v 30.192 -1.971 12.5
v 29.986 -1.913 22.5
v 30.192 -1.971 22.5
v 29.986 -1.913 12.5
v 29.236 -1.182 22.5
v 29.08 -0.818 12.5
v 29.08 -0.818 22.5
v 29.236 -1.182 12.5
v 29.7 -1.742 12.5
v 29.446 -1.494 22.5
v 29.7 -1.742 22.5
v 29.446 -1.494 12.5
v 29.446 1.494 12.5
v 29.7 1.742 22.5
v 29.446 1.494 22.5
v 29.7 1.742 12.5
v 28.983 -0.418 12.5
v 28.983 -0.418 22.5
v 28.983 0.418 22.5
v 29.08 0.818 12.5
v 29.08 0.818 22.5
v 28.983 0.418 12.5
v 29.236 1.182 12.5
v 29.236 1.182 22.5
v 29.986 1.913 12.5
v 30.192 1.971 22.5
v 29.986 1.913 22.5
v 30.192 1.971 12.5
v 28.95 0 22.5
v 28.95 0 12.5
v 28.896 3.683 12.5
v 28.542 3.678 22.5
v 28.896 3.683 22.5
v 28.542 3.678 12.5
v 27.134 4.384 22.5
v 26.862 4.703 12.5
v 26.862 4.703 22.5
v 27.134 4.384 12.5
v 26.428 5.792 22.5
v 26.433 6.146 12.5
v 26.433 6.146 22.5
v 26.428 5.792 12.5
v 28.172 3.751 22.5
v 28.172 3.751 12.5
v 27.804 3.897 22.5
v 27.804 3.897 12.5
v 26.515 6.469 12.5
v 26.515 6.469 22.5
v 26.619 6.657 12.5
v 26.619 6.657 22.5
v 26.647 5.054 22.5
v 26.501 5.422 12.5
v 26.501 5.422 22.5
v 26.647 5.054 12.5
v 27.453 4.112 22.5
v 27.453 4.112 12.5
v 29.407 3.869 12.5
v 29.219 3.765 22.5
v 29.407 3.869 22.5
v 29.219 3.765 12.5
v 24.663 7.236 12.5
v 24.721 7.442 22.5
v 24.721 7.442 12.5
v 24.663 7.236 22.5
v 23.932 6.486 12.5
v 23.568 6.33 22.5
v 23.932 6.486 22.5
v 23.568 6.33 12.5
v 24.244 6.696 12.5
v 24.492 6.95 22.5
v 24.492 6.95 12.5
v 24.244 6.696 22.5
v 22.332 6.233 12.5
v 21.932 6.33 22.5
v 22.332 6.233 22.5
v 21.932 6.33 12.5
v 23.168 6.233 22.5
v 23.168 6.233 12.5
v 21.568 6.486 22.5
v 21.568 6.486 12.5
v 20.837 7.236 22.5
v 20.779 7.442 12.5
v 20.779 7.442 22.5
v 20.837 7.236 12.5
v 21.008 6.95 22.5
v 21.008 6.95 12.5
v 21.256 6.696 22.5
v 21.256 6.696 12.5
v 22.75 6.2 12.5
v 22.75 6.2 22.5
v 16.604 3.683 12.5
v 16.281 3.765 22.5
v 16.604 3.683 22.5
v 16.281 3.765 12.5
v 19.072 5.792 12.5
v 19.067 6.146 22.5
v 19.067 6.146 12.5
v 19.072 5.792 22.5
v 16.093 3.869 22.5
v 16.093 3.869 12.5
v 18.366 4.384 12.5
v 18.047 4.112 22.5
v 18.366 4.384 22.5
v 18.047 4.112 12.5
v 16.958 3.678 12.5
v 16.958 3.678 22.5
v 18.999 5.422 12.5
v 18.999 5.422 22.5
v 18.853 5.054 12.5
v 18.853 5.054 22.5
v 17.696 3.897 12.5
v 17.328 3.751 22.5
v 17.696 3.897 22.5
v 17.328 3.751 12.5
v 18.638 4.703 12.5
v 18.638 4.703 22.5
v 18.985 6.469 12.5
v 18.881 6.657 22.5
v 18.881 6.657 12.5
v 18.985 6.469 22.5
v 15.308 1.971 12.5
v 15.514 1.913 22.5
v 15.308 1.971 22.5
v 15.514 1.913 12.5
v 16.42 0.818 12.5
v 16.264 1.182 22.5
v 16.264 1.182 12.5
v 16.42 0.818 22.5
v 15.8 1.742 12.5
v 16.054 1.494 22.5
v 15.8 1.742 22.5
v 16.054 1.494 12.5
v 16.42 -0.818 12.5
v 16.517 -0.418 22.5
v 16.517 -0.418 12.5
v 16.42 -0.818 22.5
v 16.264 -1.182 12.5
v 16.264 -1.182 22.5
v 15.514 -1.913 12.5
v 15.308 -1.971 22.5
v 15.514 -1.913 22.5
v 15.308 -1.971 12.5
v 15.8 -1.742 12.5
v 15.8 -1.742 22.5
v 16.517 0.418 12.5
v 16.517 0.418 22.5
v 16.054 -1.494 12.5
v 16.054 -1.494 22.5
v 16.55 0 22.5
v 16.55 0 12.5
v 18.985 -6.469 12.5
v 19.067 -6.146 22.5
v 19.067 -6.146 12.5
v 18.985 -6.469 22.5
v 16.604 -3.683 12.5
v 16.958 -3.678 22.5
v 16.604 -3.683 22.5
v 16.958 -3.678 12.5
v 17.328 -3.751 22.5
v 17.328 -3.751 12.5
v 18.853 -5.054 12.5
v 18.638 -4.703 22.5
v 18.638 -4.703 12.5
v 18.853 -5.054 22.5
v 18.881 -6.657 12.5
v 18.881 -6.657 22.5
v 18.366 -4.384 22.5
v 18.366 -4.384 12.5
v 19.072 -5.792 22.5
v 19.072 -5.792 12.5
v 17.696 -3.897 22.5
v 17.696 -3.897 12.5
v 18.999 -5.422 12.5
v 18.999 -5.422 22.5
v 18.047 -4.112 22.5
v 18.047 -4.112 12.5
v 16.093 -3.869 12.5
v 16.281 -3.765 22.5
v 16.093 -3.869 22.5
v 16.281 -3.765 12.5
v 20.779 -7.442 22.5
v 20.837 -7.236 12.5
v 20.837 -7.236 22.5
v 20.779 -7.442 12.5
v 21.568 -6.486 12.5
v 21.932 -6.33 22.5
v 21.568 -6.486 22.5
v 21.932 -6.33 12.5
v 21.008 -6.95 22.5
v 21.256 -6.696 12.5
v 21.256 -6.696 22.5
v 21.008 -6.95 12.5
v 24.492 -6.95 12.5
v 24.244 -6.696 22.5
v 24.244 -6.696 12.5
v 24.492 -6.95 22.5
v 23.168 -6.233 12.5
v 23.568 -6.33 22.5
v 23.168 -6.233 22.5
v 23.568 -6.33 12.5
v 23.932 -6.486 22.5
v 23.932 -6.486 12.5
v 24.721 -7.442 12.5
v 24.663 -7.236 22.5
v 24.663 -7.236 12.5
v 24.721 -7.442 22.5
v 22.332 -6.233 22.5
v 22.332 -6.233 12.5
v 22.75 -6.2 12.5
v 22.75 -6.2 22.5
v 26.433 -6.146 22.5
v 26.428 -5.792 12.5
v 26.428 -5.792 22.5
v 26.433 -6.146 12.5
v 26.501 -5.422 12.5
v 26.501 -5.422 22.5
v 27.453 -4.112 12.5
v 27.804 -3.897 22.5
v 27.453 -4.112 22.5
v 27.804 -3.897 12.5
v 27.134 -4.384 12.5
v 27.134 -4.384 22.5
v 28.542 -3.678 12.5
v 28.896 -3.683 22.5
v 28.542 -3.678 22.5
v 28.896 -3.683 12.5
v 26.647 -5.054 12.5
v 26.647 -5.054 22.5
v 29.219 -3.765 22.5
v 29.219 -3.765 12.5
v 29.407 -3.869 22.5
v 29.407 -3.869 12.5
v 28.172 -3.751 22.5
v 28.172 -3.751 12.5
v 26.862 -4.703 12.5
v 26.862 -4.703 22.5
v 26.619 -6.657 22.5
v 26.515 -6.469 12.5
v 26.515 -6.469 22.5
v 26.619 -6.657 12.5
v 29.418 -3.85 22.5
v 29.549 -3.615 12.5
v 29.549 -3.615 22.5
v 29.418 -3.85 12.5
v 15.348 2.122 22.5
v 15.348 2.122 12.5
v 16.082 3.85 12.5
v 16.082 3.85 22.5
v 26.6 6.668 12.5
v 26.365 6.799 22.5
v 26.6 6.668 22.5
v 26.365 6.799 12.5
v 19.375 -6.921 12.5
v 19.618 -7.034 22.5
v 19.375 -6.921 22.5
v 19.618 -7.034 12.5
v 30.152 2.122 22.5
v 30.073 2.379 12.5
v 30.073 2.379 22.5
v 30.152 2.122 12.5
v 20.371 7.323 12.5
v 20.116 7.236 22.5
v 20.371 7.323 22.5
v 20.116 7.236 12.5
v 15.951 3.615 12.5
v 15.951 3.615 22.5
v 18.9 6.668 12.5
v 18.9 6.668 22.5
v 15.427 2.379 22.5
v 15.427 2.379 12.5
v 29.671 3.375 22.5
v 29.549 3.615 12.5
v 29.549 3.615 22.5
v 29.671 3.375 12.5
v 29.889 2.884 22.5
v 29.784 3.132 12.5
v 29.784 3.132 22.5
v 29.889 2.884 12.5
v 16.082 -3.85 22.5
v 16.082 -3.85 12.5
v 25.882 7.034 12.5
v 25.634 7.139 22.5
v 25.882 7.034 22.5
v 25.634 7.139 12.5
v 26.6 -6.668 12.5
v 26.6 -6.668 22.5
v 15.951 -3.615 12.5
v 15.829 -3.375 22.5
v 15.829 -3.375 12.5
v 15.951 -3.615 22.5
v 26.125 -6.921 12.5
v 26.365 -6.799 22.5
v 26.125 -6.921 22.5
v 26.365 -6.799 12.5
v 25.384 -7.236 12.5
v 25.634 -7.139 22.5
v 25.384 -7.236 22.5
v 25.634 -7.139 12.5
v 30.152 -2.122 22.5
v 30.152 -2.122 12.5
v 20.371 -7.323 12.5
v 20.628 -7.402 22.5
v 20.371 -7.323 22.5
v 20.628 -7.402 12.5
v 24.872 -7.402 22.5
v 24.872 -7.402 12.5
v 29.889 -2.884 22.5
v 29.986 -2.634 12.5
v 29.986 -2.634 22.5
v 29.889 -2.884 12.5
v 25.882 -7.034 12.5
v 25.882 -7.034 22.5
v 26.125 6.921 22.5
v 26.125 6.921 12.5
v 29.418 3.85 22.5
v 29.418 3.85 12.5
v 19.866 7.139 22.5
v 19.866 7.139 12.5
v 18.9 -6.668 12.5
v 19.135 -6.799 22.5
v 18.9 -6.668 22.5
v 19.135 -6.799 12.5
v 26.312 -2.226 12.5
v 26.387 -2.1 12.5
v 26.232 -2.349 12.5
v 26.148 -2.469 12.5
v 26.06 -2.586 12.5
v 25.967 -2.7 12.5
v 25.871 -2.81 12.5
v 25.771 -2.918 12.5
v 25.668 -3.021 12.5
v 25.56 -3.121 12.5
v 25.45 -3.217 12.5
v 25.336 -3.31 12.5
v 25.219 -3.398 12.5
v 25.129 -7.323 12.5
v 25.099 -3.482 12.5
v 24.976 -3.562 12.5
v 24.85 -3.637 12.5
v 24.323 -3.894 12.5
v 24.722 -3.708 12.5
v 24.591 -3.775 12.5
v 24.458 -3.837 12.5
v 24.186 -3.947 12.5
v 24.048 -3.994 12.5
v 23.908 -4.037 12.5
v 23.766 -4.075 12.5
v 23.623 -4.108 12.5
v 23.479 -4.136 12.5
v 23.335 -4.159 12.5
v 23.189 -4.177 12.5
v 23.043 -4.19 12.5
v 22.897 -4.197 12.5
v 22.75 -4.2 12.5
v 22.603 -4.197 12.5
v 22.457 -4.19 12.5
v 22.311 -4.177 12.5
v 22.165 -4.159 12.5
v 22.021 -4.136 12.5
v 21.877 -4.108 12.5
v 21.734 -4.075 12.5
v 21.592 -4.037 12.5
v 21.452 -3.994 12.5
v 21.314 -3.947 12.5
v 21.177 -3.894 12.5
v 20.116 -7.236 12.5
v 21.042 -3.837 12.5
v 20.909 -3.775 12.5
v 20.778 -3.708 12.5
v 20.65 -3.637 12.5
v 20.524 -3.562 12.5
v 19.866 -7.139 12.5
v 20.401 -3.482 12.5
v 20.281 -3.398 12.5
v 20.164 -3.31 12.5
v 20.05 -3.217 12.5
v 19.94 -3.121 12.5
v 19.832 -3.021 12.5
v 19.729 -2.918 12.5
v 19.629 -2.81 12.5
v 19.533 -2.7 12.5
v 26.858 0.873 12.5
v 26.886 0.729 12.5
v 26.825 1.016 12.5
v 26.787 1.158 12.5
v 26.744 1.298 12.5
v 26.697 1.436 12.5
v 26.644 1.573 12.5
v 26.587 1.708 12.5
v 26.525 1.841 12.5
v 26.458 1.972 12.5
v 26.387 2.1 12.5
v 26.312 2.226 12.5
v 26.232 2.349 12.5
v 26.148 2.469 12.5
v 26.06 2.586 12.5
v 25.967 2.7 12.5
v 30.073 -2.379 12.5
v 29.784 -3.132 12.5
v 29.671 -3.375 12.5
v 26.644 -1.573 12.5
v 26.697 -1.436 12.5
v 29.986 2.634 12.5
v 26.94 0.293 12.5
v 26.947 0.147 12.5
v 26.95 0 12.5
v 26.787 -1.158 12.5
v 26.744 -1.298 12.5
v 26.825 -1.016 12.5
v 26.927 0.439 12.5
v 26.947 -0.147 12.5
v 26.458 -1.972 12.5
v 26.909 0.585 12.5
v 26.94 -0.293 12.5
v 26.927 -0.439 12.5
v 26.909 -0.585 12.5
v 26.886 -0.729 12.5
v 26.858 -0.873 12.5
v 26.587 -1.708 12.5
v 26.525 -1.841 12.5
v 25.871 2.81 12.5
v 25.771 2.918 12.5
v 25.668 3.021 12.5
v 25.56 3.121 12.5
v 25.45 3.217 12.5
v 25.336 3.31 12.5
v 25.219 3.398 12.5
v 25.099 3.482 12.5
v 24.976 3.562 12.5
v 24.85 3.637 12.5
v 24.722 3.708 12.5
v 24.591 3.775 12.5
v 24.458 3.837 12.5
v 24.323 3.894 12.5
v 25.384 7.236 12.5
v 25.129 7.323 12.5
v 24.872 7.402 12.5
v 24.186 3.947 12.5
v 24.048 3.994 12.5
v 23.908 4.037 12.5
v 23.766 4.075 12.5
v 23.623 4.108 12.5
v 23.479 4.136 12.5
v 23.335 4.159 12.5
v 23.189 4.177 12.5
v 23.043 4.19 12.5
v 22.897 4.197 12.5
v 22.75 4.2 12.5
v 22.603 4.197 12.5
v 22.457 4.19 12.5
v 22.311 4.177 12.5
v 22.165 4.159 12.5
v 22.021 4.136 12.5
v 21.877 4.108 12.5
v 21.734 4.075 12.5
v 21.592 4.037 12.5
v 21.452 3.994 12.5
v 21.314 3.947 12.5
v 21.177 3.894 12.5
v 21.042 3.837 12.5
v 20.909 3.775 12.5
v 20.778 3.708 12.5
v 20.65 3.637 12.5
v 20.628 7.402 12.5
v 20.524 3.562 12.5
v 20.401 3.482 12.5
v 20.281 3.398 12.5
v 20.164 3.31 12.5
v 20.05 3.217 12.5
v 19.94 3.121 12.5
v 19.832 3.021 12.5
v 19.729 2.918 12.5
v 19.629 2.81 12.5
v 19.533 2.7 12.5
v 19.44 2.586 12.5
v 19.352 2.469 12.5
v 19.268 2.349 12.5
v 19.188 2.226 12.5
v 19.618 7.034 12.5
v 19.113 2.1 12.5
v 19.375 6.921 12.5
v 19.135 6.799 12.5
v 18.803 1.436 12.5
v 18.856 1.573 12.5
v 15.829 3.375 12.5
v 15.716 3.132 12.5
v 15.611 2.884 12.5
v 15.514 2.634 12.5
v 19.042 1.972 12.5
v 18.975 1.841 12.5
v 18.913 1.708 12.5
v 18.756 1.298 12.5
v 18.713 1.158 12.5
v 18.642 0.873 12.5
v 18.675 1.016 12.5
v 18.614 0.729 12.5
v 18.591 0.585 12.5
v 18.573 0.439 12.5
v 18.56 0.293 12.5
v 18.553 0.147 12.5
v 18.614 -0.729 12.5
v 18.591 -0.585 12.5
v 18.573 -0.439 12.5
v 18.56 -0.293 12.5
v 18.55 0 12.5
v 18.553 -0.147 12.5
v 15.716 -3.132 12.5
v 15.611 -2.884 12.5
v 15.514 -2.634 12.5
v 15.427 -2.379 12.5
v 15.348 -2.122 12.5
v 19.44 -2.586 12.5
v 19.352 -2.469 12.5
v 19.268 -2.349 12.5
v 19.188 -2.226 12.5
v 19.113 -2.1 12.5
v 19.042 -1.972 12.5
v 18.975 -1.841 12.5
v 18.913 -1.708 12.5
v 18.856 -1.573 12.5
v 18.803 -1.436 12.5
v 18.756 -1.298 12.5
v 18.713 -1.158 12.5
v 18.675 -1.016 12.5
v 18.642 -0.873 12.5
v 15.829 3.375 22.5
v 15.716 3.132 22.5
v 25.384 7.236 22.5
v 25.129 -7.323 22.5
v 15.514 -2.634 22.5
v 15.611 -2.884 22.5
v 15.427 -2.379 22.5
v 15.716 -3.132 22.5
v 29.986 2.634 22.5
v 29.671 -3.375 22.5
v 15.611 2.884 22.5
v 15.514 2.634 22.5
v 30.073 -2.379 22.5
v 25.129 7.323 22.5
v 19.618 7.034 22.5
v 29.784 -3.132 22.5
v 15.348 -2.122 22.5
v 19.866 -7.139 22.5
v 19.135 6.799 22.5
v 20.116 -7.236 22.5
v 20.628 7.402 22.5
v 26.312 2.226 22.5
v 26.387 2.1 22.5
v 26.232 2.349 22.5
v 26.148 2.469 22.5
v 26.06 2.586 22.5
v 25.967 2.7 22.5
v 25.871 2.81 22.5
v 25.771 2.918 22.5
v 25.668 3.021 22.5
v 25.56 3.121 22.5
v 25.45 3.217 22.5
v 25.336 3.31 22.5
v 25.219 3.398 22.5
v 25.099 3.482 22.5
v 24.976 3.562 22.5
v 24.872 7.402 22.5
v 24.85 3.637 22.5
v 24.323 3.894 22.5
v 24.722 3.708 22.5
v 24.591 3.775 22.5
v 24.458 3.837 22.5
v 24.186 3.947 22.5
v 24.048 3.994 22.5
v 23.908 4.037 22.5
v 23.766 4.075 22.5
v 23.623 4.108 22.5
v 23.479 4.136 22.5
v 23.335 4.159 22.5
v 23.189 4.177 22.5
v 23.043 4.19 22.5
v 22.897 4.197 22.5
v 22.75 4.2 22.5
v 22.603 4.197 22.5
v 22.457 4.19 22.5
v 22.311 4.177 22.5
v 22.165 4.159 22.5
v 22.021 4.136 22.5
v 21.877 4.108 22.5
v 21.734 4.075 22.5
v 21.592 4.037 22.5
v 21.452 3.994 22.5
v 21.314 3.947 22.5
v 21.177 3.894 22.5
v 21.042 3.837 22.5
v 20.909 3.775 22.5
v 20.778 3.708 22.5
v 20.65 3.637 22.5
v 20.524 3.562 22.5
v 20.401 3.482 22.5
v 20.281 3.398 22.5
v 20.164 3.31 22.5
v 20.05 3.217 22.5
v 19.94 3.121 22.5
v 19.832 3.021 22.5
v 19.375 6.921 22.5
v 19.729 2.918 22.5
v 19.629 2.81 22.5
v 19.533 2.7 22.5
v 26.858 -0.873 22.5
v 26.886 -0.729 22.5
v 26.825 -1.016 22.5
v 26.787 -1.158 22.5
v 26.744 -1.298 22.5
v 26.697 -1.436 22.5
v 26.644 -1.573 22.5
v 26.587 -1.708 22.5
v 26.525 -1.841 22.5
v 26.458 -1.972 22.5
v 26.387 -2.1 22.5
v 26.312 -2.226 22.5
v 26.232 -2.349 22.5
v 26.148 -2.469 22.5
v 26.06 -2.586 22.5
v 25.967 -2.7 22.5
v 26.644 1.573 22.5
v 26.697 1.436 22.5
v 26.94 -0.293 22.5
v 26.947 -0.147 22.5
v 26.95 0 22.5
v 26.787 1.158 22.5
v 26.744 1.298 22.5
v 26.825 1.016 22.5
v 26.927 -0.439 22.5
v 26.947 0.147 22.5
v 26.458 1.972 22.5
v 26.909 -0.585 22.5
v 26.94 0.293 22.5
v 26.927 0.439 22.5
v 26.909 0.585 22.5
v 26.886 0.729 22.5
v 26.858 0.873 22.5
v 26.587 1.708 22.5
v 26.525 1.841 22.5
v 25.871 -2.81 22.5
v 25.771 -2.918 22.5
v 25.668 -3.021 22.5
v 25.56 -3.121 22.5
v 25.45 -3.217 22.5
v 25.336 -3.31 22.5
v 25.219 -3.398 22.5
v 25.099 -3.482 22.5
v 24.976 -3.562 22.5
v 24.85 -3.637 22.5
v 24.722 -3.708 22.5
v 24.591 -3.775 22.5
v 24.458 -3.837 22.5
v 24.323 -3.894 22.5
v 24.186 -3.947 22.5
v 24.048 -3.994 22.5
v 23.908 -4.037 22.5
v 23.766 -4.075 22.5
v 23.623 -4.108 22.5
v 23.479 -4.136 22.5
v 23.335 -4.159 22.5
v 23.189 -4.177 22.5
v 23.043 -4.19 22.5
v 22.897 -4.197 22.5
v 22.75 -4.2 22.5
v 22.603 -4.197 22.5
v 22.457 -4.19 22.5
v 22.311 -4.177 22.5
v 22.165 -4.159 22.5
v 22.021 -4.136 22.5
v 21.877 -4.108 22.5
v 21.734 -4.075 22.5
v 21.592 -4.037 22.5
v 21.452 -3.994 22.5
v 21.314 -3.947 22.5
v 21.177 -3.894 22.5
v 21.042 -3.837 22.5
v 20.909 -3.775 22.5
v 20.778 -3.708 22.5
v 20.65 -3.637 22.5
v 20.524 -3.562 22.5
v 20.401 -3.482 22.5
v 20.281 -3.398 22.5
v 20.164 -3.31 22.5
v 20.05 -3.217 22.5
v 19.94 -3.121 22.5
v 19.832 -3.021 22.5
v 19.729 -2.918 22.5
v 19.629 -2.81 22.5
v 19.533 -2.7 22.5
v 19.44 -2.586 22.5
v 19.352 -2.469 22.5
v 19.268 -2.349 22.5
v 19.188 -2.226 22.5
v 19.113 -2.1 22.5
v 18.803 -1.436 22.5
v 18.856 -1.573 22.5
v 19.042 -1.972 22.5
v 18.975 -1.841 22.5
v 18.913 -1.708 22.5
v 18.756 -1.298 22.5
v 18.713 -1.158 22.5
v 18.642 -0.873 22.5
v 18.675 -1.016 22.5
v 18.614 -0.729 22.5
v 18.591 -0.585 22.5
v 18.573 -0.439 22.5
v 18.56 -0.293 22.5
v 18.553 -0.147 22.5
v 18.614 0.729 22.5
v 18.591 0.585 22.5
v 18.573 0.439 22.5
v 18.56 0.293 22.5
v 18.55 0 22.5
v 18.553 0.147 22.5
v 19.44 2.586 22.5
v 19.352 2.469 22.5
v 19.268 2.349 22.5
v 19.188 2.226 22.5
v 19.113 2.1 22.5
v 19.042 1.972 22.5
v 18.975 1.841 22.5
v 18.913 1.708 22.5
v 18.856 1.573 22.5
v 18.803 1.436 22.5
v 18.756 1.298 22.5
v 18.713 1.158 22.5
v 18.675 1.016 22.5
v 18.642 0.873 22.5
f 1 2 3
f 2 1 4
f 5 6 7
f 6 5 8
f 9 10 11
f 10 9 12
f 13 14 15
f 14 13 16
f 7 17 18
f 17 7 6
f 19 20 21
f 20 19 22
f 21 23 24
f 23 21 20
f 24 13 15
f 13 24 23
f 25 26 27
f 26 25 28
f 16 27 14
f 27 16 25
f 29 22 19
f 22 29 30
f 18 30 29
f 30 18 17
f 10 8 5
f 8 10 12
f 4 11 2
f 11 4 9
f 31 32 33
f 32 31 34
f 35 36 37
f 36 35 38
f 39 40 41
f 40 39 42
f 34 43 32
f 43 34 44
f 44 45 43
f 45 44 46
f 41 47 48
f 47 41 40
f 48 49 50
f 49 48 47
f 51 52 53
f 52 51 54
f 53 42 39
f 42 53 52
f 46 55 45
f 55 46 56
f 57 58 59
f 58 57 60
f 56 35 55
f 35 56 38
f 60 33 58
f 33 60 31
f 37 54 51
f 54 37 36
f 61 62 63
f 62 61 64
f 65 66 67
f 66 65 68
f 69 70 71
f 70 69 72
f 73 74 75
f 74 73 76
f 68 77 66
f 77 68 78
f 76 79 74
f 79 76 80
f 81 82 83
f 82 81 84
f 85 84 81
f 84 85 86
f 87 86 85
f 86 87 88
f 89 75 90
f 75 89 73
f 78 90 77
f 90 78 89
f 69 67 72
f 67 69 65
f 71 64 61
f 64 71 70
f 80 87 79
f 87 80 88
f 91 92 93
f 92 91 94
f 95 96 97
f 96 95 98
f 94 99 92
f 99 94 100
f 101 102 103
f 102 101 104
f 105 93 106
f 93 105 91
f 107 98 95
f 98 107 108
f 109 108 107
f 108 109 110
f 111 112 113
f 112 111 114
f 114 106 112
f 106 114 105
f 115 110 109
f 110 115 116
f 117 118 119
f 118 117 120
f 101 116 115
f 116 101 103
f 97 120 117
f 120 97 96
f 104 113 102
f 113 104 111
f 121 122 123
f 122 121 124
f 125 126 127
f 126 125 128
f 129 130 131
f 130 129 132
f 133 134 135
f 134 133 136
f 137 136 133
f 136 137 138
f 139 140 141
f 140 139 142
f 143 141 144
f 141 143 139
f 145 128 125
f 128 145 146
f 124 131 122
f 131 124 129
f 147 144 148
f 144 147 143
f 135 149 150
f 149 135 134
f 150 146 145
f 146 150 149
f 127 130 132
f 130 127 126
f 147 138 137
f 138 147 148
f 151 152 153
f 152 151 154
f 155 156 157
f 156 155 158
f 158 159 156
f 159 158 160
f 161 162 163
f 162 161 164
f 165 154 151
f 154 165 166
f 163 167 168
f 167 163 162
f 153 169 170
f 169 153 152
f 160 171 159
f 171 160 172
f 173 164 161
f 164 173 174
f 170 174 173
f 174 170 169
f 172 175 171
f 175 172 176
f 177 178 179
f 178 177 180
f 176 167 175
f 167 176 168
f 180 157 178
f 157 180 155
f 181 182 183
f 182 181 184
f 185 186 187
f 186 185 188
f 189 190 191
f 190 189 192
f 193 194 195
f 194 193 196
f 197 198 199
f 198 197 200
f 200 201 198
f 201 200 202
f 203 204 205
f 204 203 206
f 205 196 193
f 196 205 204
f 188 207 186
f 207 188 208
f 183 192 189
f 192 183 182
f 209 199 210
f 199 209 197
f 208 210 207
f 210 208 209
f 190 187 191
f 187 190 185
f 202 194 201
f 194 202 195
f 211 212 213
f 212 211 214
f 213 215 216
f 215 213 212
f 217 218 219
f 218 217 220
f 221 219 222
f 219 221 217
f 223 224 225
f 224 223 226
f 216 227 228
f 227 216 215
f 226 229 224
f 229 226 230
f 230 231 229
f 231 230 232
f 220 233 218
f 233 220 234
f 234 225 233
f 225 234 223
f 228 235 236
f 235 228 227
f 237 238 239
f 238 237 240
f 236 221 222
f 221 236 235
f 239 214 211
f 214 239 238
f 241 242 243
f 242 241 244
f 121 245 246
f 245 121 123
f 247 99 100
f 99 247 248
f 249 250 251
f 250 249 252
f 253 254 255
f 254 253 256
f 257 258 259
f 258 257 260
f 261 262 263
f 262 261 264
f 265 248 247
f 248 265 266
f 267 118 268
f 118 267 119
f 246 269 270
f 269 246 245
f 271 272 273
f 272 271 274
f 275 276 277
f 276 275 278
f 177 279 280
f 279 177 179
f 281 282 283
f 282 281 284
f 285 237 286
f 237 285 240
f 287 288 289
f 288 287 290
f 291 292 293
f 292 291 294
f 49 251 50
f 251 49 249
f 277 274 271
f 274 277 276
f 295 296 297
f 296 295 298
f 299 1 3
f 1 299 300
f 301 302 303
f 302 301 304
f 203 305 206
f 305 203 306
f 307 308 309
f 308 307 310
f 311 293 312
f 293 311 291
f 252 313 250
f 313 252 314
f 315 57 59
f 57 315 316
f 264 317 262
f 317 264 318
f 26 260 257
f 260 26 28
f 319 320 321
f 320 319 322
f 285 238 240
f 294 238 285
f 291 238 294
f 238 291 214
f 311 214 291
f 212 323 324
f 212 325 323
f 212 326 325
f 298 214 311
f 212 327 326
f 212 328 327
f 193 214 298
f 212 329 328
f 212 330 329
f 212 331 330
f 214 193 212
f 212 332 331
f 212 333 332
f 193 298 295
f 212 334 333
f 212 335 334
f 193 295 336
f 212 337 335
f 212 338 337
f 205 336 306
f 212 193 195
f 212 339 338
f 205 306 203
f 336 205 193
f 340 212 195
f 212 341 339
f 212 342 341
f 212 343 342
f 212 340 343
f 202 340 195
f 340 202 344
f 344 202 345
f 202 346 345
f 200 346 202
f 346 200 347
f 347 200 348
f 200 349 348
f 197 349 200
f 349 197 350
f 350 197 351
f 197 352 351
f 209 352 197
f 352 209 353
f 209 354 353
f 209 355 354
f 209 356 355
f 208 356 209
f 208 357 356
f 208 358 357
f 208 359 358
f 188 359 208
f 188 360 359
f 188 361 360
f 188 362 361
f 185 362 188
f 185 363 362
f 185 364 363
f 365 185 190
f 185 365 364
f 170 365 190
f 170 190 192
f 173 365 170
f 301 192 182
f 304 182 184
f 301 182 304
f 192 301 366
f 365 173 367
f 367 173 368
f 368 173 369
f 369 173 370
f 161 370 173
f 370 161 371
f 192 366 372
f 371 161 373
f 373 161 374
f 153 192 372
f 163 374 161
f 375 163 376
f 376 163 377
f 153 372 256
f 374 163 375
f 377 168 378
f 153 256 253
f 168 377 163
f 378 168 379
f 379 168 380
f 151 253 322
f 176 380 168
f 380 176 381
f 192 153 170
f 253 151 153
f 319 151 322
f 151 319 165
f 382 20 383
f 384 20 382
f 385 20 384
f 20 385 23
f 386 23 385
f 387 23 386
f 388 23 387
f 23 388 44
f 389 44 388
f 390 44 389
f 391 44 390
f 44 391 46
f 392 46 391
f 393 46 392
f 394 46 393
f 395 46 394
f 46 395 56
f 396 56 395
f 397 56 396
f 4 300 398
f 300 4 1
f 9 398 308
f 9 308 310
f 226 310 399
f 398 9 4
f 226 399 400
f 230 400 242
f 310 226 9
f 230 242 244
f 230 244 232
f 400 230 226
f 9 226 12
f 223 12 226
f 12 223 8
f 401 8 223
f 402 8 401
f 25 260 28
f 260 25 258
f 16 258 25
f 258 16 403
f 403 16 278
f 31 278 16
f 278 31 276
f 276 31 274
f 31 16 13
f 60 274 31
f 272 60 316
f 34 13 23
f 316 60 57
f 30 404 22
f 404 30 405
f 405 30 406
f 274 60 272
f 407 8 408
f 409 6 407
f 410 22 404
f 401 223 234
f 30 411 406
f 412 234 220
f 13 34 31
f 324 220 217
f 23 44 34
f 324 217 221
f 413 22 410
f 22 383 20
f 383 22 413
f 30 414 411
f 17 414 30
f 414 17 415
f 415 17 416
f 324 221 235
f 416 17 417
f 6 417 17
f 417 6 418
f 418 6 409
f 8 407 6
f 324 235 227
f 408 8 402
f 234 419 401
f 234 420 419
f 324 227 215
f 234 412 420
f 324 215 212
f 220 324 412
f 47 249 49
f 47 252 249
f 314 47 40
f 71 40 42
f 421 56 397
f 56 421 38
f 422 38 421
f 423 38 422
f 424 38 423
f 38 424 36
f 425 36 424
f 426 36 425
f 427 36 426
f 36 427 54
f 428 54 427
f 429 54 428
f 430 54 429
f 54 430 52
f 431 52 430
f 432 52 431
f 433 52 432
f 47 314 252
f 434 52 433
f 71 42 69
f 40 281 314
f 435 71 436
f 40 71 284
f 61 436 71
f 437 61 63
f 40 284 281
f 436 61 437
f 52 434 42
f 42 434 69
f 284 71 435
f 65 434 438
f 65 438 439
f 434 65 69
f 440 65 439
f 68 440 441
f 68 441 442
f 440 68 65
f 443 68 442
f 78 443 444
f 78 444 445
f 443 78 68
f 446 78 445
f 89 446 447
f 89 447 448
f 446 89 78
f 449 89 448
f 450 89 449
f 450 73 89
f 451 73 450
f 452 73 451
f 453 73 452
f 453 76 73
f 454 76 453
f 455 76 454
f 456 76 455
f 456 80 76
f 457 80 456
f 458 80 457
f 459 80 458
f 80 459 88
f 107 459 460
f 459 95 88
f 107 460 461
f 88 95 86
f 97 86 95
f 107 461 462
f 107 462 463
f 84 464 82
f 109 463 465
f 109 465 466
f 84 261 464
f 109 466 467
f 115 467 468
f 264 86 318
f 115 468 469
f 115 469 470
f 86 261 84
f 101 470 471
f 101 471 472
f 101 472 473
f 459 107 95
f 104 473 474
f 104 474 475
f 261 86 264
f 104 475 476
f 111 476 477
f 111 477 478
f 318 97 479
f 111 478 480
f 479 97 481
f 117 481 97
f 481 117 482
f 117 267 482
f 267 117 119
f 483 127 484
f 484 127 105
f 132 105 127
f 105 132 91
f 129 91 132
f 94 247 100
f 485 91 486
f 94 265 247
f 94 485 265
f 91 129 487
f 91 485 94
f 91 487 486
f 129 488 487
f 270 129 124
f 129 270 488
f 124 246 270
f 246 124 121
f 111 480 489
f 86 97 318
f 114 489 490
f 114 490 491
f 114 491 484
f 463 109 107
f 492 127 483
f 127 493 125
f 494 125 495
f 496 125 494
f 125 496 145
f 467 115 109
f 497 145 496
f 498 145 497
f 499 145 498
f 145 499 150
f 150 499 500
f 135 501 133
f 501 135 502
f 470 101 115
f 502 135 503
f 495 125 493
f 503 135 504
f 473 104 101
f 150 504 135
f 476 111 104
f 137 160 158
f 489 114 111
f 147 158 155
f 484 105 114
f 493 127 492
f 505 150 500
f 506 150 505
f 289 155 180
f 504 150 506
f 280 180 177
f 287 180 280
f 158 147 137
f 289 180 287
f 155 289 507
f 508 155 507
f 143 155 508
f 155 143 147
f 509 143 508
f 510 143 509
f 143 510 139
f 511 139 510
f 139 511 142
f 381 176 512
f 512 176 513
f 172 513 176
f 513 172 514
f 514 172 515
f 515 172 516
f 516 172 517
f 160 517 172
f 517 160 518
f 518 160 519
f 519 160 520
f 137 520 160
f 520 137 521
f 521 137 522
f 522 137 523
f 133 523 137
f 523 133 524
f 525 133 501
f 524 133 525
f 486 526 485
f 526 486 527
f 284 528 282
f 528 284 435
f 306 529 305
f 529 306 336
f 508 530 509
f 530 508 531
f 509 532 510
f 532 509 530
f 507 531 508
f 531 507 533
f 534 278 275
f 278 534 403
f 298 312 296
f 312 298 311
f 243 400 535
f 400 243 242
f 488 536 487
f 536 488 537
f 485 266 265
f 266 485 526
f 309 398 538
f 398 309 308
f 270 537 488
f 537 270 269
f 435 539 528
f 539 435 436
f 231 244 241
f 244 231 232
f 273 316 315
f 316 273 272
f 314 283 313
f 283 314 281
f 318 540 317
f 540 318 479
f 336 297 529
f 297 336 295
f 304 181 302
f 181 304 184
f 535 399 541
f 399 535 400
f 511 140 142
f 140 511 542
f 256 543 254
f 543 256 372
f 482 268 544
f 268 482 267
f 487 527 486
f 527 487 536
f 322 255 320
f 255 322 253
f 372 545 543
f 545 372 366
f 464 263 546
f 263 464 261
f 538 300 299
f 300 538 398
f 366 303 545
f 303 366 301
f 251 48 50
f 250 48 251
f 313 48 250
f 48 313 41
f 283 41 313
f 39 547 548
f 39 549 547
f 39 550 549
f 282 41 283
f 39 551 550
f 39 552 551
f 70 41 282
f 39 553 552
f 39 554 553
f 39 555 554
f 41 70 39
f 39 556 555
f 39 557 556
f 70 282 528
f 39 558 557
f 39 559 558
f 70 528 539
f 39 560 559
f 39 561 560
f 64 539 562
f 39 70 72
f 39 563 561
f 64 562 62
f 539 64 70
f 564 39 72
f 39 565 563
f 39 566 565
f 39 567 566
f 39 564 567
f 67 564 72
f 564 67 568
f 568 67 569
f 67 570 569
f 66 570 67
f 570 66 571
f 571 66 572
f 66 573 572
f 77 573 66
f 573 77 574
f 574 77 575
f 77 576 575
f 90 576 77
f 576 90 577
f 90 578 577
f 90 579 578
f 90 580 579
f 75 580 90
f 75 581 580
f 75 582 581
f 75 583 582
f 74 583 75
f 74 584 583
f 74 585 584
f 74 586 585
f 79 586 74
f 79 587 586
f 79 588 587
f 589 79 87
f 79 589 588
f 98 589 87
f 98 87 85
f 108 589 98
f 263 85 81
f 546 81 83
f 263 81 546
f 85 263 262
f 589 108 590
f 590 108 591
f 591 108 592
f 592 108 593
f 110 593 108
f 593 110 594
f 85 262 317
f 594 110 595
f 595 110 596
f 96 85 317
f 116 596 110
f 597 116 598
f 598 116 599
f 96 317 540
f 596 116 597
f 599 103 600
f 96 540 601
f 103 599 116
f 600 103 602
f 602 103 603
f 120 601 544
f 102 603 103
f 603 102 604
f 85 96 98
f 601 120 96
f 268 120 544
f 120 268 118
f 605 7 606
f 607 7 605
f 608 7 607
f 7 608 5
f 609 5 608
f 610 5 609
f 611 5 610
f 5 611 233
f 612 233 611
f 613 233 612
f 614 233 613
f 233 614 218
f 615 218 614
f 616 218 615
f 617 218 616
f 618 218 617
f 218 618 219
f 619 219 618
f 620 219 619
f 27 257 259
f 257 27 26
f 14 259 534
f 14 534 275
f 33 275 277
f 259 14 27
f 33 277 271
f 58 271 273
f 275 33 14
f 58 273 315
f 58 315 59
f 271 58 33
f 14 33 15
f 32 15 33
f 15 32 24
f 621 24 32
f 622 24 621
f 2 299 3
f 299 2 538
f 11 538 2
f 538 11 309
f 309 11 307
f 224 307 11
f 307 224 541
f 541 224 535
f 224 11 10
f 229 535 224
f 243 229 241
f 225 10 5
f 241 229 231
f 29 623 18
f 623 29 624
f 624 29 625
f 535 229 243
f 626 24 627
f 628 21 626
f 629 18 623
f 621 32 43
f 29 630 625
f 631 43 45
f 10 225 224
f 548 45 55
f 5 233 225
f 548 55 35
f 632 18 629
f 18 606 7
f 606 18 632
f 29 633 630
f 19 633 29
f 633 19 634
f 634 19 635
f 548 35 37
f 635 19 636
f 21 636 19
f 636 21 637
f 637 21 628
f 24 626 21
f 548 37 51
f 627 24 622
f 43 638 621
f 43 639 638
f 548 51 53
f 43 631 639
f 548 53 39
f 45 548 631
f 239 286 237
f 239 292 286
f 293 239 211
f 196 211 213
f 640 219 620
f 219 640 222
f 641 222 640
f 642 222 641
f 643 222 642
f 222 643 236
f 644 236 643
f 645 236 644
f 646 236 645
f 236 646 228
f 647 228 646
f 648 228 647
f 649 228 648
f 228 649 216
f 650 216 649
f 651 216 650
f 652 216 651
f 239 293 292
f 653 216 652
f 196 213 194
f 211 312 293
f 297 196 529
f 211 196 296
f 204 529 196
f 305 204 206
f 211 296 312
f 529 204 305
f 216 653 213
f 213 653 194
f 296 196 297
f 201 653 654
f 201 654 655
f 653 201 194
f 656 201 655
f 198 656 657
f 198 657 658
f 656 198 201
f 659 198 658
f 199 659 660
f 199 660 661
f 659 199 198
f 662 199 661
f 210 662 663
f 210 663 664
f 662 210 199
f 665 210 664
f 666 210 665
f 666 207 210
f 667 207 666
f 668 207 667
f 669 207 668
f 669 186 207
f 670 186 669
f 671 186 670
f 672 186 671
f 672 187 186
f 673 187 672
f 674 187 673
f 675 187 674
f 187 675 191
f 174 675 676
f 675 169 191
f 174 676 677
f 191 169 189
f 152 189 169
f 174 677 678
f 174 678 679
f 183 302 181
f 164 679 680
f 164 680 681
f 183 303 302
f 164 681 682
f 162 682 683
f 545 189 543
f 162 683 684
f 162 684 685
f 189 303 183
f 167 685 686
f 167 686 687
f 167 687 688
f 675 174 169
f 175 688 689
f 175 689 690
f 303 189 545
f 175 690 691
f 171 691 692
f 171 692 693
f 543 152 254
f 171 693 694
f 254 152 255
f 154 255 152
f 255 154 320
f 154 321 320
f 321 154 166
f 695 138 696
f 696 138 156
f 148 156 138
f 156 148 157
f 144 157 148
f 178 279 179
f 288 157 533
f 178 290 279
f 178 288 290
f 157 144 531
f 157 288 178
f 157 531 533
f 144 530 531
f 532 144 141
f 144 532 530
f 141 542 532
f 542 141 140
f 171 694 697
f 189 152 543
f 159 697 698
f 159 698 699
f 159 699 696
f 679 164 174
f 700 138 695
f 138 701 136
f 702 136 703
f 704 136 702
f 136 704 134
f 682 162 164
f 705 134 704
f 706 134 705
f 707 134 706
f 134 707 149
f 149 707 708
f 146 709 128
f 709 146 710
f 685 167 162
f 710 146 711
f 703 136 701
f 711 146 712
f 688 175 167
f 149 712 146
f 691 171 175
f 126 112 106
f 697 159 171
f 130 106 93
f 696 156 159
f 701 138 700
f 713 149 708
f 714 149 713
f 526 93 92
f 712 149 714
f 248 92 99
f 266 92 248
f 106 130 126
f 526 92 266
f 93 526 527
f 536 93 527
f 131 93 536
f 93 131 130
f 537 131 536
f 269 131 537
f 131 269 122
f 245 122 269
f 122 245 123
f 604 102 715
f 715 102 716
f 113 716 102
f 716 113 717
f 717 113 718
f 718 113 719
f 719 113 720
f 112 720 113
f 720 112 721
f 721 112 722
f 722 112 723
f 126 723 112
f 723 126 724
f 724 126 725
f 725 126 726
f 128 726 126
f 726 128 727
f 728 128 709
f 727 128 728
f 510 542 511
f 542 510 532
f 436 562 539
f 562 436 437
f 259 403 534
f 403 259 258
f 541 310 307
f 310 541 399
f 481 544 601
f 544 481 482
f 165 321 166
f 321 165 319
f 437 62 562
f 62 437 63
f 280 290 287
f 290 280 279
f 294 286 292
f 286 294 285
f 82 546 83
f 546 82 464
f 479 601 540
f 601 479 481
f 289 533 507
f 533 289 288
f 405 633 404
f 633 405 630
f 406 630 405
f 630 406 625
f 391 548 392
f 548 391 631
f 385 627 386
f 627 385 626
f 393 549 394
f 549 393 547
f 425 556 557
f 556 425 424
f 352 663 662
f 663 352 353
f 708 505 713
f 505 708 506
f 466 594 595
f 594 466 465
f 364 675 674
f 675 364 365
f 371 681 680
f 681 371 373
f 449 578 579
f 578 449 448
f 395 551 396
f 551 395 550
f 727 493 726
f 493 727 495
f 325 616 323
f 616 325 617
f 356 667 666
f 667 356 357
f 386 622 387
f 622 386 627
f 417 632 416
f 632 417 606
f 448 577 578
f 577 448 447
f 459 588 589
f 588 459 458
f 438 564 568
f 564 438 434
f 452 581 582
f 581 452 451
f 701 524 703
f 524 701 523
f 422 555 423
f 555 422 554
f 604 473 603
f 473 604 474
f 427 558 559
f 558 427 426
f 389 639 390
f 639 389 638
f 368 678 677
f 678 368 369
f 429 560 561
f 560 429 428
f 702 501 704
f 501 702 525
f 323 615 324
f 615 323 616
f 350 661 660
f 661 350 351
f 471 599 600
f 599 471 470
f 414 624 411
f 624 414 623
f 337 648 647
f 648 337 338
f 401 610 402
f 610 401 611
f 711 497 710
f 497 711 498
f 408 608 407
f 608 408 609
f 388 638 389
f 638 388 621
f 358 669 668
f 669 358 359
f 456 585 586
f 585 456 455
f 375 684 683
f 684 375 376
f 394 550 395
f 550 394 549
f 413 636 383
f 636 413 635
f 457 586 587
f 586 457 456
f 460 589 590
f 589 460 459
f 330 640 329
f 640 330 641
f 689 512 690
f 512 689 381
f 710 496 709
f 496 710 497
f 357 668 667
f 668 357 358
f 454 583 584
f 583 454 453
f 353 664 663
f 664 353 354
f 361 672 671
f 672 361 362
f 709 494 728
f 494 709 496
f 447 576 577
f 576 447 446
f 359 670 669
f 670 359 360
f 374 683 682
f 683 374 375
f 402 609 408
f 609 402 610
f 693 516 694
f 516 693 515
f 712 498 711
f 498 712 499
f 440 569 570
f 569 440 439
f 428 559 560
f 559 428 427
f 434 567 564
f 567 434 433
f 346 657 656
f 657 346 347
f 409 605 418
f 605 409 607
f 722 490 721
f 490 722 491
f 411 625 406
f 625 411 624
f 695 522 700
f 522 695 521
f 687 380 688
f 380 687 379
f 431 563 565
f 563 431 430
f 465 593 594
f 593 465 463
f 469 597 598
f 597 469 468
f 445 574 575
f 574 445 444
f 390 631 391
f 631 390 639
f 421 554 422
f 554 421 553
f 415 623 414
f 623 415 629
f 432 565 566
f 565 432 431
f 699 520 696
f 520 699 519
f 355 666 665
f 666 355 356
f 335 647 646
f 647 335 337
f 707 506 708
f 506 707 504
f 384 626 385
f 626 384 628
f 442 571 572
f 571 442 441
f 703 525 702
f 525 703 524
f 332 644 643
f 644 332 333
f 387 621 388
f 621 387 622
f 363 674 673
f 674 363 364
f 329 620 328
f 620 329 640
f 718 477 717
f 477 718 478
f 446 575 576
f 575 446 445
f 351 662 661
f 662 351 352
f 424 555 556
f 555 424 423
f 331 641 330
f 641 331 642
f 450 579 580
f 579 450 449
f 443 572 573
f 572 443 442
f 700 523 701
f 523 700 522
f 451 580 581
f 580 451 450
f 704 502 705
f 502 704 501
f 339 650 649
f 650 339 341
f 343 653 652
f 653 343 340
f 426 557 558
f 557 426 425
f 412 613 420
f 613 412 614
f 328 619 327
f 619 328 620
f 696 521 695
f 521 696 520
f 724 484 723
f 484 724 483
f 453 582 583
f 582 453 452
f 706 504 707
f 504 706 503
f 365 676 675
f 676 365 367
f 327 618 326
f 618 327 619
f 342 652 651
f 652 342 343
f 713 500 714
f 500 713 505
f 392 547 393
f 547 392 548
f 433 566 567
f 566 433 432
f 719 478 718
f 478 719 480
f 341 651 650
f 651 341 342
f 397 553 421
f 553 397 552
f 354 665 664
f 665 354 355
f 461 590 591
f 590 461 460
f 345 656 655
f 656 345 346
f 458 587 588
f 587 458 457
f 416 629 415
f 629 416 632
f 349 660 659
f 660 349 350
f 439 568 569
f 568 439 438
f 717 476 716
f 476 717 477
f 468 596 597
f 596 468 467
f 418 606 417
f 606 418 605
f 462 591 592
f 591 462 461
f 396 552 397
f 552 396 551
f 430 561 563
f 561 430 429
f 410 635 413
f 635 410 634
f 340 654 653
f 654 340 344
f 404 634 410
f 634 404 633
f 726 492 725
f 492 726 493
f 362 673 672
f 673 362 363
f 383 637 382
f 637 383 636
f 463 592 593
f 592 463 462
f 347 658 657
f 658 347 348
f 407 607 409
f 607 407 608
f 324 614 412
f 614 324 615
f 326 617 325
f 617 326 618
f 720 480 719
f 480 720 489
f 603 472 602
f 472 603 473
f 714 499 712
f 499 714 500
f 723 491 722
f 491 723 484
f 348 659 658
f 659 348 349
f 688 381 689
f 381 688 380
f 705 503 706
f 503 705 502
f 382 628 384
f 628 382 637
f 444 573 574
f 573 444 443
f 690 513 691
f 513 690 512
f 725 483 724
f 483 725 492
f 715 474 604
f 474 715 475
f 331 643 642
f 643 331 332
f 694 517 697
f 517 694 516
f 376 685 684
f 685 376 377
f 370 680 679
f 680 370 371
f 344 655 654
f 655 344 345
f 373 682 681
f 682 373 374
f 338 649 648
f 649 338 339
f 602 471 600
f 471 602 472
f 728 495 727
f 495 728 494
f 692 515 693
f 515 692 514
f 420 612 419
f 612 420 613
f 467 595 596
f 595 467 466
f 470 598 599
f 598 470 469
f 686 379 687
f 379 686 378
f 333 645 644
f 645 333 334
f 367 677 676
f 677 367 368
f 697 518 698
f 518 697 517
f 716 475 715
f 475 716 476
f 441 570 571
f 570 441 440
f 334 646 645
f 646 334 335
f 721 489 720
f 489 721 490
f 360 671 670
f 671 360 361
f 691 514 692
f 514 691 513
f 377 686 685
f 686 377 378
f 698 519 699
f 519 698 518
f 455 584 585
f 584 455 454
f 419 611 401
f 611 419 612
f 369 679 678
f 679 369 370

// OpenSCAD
/////////////////////////////////////////////////////////////////
//Printing notes
/////////////////////////////////////////////////////////////////

//infill = 100%
//material = generic TPU 95

////////////////////////////////////////////////////////////////






A = 180;        //Large  circle resolution
B = 30;         //small  circle resolution


/*
difference(){
translate([0,0,17.5])cylinder(h = 10, d=61.2+6, $fn = A, center = true);

translate([0,0,17.5])cylinder(h = 11, d=61.2, $fn = A, center = true);

//for(i=[0:3*2*2*2*2*2]) translate([0,0,17.5]) rotate([0,0,(i+22.5)*90/2/2/2]) translate([30.6,0,0]) cylinder(h = 31, d=3, $fn = B, center = true);

}





difference(){
for(i=[0:3*2*2*2*2*2]) translate([0,0,17.5]) rotate([0,0,i*90/2/2/2]) translate([30.6,0,0]) resize([3,3,10]) cylinder(h = 10, d=3, $fn = B, center = true);
    
//translate([0,0,17.5]) cylinder(h = 31, d=55, $fn = A, center = true);




//translate([0,0,30]) cylinder(h = 5, d2=62, d1=55, $fn = A, center = true); 
    
//translate([0,0,5]) cylinder(h = 5, d1=62, d2=55, $fn = A, center = true);  

}



*/











translate([22.75,0,0]){
difference(){
translate([0,0,17.5])cylinder(h = 10, d=15.4, $fn = A, center = true);

for(i=[0:3*2*2*2]) translate([0,0,17.5]) rotate([0,0,i*90/2]) translate([7.7,0,0]) resize([3,4,31]) cylinder(h = 10, d=3, $fn = B, center = true);
    
translate([0,0,17.5])cylinder(h = 11, d=15.4-7, $fn = A, center = true);


}}
